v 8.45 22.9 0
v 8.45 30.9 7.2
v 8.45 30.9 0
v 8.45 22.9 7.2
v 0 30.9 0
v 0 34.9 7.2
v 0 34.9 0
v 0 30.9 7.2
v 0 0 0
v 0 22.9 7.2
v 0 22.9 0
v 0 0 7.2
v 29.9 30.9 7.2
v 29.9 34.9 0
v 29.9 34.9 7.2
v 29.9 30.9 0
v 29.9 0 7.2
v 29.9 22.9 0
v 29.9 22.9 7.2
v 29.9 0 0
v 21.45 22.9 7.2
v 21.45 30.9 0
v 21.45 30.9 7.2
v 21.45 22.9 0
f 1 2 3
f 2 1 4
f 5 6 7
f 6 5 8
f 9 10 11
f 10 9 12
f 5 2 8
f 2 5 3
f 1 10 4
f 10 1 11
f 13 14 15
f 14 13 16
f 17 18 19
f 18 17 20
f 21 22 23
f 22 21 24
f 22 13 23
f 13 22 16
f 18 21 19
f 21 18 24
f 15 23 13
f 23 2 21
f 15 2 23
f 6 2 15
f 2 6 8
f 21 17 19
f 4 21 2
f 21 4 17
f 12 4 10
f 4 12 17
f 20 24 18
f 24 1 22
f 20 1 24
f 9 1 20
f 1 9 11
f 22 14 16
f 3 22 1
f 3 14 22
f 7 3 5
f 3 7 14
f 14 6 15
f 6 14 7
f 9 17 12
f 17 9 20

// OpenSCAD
eps = 0.01;
spacing = 0.5;
d = 13;
dh = 8;

x_raw = 30.9;
y_raw = 22.9;
z_raw = 8.2;
x = x_raw - 2*spacing;
y = y_raw + dh + dh/2;
z = z_raw - 2*spacing;

cut = (x - d)/2;
echo(cut);

difference()
{
  cube([x, y, z]);
  for(dx=[0, x-cut])
    translate([dx, y_raw, -eps])
      #cube([cut, dh, z + 2*eps]);
}
